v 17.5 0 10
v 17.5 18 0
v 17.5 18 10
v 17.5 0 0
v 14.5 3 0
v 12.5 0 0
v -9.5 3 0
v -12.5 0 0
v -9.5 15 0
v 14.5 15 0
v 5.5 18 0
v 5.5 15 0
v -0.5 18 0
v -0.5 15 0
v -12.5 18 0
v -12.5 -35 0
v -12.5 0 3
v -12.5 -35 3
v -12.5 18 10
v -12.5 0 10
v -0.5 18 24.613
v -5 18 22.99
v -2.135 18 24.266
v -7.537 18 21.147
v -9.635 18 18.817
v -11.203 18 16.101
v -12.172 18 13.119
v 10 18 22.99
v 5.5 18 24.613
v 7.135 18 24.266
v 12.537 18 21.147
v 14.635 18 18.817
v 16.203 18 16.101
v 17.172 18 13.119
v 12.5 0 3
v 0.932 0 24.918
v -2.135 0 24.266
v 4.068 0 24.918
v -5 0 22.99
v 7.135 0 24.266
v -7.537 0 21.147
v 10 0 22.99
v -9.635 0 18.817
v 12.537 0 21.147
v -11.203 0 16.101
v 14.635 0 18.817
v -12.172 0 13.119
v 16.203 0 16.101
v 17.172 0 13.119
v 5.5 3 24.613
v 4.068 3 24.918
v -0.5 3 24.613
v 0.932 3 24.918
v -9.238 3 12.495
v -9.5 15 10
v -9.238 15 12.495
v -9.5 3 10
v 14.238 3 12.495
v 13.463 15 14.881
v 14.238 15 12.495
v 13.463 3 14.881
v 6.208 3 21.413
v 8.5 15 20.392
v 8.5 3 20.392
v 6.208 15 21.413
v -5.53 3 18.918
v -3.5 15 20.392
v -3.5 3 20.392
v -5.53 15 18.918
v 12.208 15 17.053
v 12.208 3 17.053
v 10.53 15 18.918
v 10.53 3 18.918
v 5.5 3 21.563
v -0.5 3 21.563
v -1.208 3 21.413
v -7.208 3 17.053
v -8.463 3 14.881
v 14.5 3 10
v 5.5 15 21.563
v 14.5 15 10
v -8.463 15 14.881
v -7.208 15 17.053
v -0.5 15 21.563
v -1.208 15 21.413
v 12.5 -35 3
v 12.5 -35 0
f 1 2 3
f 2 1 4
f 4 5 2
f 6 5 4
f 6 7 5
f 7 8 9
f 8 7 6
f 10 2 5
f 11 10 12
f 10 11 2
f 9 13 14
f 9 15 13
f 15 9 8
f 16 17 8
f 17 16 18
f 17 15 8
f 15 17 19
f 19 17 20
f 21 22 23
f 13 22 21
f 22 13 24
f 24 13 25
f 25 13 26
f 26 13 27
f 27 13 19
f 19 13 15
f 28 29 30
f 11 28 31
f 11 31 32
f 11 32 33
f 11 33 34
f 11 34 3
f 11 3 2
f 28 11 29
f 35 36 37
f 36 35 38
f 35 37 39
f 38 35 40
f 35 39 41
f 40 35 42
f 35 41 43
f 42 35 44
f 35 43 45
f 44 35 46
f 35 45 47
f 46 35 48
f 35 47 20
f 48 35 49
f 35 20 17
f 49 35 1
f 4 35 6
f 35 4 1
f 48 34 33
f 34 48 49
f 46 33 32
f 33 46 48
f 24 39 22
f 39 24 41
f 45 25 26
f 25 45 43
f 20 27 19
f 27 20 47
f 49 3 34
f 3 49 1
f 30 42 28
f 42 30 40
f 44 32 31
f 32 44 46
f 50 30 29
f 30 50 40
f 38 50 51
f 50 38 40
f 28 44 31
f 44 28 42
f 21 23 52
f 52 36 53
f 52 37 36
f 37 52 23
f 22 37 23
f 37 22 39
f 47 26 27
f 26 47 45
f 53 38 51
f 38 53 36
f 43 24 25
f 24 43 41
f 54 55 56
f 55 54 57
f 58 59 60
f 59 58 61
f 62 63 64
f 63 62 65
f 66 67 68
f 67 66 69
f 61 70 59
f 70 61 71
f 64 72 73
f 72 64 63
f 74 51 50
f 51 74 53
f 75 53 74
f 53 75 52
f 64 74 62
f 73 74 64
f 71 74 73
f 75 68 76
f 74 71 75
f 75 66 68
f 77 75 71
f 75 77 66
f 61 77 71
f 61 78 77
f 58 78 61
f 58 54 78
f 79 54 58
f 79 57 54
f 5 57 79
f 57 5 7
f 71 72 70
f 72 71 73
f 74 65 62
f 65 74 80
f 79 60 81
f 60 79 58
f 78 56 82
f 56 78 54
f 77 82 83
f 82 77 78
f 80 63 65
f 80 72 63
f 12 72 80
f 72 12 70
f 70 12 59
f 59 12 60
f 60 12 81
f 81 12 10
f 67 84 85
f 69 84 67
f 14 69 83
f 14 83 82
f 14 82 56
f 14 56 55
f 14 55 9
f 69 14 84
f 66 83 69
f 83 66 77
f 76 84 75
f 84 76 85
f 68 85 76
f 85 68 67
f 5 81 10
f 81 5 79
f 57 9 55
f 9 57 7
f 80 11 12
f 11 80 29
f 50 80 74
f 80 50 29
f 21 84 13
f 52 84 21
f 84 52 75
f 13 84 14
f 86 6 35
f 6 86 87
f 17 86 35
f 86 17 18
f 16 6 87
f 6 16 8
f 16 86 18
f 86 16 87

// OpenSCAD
// -*- mode: SCAD ; c-file-style: "ellemtel" ; coding: utf-8 -*-
//
// Hook for the line of IKEA window blinds.
//
// © 2017 Roland Sieker <ospalh@gmail.com>
// Licence: CC-BY-SA 4.0

b_width = 25;
arm_length = 35;
arm_height = 3;
hook_height = 25;
hook_wall = 3;
knob_thickness = 12;
knob_radius = 12;
hook_thickness = knob_thickness + 2 * hook_wall;
line_width = 6;
ms = 0.01;
h_width = 2 * (knob_radius + hook_wall);

translate([-b_width/2, -arm_length, 0])
{
   // Base
   cube([b_width, arm_length, arm_height]);
}
translate([0.5*(h_width-b_width), 0, 0])
{
   difference()
   {
      union()
      {
         // Lower part of took
         translate([-h_width/2, 0, 0])
         {
            cube([h_width, hook_thickness, hook_height-knob_radius-hook_wall]);
         }
         translate([0, 0, hook_height-knob_radius-hook_wall])
         {
            // upper part of hook
            rotate([-90, 0, 0])
            {
               cylinder(r=h_width/2, h=hook_thickness);
            }
         }
      }
      translate([0, hook_wall, hook_height-knob_radius-hook_wall])
      {
         // Space where the knob will rest
         rotate([-90, 0, 0])
         {
            cylinder(r=knob_radius, h=knob_thickness);
         }
      }
      translate([-h_width/2+hook_wall, hook_wall, -knob_radius-hook_wall])
      {
         // Space to insert the knob
         cube([2*knob_radius, knob_thickness, hook_height]);
      }
      translate([-line_width/2, hook_wall, -ms])
      {
         // space for the line
         cube([line_width, hook_thickness, hook_height+2*ms]);
      }
      translate([-h_width/2, -h_width,-h_width])
      {
         // Cut off the lower part of the upper part of the hook
         cube([2*h_width,2*h_width,h_width]);
      }
   }
}
